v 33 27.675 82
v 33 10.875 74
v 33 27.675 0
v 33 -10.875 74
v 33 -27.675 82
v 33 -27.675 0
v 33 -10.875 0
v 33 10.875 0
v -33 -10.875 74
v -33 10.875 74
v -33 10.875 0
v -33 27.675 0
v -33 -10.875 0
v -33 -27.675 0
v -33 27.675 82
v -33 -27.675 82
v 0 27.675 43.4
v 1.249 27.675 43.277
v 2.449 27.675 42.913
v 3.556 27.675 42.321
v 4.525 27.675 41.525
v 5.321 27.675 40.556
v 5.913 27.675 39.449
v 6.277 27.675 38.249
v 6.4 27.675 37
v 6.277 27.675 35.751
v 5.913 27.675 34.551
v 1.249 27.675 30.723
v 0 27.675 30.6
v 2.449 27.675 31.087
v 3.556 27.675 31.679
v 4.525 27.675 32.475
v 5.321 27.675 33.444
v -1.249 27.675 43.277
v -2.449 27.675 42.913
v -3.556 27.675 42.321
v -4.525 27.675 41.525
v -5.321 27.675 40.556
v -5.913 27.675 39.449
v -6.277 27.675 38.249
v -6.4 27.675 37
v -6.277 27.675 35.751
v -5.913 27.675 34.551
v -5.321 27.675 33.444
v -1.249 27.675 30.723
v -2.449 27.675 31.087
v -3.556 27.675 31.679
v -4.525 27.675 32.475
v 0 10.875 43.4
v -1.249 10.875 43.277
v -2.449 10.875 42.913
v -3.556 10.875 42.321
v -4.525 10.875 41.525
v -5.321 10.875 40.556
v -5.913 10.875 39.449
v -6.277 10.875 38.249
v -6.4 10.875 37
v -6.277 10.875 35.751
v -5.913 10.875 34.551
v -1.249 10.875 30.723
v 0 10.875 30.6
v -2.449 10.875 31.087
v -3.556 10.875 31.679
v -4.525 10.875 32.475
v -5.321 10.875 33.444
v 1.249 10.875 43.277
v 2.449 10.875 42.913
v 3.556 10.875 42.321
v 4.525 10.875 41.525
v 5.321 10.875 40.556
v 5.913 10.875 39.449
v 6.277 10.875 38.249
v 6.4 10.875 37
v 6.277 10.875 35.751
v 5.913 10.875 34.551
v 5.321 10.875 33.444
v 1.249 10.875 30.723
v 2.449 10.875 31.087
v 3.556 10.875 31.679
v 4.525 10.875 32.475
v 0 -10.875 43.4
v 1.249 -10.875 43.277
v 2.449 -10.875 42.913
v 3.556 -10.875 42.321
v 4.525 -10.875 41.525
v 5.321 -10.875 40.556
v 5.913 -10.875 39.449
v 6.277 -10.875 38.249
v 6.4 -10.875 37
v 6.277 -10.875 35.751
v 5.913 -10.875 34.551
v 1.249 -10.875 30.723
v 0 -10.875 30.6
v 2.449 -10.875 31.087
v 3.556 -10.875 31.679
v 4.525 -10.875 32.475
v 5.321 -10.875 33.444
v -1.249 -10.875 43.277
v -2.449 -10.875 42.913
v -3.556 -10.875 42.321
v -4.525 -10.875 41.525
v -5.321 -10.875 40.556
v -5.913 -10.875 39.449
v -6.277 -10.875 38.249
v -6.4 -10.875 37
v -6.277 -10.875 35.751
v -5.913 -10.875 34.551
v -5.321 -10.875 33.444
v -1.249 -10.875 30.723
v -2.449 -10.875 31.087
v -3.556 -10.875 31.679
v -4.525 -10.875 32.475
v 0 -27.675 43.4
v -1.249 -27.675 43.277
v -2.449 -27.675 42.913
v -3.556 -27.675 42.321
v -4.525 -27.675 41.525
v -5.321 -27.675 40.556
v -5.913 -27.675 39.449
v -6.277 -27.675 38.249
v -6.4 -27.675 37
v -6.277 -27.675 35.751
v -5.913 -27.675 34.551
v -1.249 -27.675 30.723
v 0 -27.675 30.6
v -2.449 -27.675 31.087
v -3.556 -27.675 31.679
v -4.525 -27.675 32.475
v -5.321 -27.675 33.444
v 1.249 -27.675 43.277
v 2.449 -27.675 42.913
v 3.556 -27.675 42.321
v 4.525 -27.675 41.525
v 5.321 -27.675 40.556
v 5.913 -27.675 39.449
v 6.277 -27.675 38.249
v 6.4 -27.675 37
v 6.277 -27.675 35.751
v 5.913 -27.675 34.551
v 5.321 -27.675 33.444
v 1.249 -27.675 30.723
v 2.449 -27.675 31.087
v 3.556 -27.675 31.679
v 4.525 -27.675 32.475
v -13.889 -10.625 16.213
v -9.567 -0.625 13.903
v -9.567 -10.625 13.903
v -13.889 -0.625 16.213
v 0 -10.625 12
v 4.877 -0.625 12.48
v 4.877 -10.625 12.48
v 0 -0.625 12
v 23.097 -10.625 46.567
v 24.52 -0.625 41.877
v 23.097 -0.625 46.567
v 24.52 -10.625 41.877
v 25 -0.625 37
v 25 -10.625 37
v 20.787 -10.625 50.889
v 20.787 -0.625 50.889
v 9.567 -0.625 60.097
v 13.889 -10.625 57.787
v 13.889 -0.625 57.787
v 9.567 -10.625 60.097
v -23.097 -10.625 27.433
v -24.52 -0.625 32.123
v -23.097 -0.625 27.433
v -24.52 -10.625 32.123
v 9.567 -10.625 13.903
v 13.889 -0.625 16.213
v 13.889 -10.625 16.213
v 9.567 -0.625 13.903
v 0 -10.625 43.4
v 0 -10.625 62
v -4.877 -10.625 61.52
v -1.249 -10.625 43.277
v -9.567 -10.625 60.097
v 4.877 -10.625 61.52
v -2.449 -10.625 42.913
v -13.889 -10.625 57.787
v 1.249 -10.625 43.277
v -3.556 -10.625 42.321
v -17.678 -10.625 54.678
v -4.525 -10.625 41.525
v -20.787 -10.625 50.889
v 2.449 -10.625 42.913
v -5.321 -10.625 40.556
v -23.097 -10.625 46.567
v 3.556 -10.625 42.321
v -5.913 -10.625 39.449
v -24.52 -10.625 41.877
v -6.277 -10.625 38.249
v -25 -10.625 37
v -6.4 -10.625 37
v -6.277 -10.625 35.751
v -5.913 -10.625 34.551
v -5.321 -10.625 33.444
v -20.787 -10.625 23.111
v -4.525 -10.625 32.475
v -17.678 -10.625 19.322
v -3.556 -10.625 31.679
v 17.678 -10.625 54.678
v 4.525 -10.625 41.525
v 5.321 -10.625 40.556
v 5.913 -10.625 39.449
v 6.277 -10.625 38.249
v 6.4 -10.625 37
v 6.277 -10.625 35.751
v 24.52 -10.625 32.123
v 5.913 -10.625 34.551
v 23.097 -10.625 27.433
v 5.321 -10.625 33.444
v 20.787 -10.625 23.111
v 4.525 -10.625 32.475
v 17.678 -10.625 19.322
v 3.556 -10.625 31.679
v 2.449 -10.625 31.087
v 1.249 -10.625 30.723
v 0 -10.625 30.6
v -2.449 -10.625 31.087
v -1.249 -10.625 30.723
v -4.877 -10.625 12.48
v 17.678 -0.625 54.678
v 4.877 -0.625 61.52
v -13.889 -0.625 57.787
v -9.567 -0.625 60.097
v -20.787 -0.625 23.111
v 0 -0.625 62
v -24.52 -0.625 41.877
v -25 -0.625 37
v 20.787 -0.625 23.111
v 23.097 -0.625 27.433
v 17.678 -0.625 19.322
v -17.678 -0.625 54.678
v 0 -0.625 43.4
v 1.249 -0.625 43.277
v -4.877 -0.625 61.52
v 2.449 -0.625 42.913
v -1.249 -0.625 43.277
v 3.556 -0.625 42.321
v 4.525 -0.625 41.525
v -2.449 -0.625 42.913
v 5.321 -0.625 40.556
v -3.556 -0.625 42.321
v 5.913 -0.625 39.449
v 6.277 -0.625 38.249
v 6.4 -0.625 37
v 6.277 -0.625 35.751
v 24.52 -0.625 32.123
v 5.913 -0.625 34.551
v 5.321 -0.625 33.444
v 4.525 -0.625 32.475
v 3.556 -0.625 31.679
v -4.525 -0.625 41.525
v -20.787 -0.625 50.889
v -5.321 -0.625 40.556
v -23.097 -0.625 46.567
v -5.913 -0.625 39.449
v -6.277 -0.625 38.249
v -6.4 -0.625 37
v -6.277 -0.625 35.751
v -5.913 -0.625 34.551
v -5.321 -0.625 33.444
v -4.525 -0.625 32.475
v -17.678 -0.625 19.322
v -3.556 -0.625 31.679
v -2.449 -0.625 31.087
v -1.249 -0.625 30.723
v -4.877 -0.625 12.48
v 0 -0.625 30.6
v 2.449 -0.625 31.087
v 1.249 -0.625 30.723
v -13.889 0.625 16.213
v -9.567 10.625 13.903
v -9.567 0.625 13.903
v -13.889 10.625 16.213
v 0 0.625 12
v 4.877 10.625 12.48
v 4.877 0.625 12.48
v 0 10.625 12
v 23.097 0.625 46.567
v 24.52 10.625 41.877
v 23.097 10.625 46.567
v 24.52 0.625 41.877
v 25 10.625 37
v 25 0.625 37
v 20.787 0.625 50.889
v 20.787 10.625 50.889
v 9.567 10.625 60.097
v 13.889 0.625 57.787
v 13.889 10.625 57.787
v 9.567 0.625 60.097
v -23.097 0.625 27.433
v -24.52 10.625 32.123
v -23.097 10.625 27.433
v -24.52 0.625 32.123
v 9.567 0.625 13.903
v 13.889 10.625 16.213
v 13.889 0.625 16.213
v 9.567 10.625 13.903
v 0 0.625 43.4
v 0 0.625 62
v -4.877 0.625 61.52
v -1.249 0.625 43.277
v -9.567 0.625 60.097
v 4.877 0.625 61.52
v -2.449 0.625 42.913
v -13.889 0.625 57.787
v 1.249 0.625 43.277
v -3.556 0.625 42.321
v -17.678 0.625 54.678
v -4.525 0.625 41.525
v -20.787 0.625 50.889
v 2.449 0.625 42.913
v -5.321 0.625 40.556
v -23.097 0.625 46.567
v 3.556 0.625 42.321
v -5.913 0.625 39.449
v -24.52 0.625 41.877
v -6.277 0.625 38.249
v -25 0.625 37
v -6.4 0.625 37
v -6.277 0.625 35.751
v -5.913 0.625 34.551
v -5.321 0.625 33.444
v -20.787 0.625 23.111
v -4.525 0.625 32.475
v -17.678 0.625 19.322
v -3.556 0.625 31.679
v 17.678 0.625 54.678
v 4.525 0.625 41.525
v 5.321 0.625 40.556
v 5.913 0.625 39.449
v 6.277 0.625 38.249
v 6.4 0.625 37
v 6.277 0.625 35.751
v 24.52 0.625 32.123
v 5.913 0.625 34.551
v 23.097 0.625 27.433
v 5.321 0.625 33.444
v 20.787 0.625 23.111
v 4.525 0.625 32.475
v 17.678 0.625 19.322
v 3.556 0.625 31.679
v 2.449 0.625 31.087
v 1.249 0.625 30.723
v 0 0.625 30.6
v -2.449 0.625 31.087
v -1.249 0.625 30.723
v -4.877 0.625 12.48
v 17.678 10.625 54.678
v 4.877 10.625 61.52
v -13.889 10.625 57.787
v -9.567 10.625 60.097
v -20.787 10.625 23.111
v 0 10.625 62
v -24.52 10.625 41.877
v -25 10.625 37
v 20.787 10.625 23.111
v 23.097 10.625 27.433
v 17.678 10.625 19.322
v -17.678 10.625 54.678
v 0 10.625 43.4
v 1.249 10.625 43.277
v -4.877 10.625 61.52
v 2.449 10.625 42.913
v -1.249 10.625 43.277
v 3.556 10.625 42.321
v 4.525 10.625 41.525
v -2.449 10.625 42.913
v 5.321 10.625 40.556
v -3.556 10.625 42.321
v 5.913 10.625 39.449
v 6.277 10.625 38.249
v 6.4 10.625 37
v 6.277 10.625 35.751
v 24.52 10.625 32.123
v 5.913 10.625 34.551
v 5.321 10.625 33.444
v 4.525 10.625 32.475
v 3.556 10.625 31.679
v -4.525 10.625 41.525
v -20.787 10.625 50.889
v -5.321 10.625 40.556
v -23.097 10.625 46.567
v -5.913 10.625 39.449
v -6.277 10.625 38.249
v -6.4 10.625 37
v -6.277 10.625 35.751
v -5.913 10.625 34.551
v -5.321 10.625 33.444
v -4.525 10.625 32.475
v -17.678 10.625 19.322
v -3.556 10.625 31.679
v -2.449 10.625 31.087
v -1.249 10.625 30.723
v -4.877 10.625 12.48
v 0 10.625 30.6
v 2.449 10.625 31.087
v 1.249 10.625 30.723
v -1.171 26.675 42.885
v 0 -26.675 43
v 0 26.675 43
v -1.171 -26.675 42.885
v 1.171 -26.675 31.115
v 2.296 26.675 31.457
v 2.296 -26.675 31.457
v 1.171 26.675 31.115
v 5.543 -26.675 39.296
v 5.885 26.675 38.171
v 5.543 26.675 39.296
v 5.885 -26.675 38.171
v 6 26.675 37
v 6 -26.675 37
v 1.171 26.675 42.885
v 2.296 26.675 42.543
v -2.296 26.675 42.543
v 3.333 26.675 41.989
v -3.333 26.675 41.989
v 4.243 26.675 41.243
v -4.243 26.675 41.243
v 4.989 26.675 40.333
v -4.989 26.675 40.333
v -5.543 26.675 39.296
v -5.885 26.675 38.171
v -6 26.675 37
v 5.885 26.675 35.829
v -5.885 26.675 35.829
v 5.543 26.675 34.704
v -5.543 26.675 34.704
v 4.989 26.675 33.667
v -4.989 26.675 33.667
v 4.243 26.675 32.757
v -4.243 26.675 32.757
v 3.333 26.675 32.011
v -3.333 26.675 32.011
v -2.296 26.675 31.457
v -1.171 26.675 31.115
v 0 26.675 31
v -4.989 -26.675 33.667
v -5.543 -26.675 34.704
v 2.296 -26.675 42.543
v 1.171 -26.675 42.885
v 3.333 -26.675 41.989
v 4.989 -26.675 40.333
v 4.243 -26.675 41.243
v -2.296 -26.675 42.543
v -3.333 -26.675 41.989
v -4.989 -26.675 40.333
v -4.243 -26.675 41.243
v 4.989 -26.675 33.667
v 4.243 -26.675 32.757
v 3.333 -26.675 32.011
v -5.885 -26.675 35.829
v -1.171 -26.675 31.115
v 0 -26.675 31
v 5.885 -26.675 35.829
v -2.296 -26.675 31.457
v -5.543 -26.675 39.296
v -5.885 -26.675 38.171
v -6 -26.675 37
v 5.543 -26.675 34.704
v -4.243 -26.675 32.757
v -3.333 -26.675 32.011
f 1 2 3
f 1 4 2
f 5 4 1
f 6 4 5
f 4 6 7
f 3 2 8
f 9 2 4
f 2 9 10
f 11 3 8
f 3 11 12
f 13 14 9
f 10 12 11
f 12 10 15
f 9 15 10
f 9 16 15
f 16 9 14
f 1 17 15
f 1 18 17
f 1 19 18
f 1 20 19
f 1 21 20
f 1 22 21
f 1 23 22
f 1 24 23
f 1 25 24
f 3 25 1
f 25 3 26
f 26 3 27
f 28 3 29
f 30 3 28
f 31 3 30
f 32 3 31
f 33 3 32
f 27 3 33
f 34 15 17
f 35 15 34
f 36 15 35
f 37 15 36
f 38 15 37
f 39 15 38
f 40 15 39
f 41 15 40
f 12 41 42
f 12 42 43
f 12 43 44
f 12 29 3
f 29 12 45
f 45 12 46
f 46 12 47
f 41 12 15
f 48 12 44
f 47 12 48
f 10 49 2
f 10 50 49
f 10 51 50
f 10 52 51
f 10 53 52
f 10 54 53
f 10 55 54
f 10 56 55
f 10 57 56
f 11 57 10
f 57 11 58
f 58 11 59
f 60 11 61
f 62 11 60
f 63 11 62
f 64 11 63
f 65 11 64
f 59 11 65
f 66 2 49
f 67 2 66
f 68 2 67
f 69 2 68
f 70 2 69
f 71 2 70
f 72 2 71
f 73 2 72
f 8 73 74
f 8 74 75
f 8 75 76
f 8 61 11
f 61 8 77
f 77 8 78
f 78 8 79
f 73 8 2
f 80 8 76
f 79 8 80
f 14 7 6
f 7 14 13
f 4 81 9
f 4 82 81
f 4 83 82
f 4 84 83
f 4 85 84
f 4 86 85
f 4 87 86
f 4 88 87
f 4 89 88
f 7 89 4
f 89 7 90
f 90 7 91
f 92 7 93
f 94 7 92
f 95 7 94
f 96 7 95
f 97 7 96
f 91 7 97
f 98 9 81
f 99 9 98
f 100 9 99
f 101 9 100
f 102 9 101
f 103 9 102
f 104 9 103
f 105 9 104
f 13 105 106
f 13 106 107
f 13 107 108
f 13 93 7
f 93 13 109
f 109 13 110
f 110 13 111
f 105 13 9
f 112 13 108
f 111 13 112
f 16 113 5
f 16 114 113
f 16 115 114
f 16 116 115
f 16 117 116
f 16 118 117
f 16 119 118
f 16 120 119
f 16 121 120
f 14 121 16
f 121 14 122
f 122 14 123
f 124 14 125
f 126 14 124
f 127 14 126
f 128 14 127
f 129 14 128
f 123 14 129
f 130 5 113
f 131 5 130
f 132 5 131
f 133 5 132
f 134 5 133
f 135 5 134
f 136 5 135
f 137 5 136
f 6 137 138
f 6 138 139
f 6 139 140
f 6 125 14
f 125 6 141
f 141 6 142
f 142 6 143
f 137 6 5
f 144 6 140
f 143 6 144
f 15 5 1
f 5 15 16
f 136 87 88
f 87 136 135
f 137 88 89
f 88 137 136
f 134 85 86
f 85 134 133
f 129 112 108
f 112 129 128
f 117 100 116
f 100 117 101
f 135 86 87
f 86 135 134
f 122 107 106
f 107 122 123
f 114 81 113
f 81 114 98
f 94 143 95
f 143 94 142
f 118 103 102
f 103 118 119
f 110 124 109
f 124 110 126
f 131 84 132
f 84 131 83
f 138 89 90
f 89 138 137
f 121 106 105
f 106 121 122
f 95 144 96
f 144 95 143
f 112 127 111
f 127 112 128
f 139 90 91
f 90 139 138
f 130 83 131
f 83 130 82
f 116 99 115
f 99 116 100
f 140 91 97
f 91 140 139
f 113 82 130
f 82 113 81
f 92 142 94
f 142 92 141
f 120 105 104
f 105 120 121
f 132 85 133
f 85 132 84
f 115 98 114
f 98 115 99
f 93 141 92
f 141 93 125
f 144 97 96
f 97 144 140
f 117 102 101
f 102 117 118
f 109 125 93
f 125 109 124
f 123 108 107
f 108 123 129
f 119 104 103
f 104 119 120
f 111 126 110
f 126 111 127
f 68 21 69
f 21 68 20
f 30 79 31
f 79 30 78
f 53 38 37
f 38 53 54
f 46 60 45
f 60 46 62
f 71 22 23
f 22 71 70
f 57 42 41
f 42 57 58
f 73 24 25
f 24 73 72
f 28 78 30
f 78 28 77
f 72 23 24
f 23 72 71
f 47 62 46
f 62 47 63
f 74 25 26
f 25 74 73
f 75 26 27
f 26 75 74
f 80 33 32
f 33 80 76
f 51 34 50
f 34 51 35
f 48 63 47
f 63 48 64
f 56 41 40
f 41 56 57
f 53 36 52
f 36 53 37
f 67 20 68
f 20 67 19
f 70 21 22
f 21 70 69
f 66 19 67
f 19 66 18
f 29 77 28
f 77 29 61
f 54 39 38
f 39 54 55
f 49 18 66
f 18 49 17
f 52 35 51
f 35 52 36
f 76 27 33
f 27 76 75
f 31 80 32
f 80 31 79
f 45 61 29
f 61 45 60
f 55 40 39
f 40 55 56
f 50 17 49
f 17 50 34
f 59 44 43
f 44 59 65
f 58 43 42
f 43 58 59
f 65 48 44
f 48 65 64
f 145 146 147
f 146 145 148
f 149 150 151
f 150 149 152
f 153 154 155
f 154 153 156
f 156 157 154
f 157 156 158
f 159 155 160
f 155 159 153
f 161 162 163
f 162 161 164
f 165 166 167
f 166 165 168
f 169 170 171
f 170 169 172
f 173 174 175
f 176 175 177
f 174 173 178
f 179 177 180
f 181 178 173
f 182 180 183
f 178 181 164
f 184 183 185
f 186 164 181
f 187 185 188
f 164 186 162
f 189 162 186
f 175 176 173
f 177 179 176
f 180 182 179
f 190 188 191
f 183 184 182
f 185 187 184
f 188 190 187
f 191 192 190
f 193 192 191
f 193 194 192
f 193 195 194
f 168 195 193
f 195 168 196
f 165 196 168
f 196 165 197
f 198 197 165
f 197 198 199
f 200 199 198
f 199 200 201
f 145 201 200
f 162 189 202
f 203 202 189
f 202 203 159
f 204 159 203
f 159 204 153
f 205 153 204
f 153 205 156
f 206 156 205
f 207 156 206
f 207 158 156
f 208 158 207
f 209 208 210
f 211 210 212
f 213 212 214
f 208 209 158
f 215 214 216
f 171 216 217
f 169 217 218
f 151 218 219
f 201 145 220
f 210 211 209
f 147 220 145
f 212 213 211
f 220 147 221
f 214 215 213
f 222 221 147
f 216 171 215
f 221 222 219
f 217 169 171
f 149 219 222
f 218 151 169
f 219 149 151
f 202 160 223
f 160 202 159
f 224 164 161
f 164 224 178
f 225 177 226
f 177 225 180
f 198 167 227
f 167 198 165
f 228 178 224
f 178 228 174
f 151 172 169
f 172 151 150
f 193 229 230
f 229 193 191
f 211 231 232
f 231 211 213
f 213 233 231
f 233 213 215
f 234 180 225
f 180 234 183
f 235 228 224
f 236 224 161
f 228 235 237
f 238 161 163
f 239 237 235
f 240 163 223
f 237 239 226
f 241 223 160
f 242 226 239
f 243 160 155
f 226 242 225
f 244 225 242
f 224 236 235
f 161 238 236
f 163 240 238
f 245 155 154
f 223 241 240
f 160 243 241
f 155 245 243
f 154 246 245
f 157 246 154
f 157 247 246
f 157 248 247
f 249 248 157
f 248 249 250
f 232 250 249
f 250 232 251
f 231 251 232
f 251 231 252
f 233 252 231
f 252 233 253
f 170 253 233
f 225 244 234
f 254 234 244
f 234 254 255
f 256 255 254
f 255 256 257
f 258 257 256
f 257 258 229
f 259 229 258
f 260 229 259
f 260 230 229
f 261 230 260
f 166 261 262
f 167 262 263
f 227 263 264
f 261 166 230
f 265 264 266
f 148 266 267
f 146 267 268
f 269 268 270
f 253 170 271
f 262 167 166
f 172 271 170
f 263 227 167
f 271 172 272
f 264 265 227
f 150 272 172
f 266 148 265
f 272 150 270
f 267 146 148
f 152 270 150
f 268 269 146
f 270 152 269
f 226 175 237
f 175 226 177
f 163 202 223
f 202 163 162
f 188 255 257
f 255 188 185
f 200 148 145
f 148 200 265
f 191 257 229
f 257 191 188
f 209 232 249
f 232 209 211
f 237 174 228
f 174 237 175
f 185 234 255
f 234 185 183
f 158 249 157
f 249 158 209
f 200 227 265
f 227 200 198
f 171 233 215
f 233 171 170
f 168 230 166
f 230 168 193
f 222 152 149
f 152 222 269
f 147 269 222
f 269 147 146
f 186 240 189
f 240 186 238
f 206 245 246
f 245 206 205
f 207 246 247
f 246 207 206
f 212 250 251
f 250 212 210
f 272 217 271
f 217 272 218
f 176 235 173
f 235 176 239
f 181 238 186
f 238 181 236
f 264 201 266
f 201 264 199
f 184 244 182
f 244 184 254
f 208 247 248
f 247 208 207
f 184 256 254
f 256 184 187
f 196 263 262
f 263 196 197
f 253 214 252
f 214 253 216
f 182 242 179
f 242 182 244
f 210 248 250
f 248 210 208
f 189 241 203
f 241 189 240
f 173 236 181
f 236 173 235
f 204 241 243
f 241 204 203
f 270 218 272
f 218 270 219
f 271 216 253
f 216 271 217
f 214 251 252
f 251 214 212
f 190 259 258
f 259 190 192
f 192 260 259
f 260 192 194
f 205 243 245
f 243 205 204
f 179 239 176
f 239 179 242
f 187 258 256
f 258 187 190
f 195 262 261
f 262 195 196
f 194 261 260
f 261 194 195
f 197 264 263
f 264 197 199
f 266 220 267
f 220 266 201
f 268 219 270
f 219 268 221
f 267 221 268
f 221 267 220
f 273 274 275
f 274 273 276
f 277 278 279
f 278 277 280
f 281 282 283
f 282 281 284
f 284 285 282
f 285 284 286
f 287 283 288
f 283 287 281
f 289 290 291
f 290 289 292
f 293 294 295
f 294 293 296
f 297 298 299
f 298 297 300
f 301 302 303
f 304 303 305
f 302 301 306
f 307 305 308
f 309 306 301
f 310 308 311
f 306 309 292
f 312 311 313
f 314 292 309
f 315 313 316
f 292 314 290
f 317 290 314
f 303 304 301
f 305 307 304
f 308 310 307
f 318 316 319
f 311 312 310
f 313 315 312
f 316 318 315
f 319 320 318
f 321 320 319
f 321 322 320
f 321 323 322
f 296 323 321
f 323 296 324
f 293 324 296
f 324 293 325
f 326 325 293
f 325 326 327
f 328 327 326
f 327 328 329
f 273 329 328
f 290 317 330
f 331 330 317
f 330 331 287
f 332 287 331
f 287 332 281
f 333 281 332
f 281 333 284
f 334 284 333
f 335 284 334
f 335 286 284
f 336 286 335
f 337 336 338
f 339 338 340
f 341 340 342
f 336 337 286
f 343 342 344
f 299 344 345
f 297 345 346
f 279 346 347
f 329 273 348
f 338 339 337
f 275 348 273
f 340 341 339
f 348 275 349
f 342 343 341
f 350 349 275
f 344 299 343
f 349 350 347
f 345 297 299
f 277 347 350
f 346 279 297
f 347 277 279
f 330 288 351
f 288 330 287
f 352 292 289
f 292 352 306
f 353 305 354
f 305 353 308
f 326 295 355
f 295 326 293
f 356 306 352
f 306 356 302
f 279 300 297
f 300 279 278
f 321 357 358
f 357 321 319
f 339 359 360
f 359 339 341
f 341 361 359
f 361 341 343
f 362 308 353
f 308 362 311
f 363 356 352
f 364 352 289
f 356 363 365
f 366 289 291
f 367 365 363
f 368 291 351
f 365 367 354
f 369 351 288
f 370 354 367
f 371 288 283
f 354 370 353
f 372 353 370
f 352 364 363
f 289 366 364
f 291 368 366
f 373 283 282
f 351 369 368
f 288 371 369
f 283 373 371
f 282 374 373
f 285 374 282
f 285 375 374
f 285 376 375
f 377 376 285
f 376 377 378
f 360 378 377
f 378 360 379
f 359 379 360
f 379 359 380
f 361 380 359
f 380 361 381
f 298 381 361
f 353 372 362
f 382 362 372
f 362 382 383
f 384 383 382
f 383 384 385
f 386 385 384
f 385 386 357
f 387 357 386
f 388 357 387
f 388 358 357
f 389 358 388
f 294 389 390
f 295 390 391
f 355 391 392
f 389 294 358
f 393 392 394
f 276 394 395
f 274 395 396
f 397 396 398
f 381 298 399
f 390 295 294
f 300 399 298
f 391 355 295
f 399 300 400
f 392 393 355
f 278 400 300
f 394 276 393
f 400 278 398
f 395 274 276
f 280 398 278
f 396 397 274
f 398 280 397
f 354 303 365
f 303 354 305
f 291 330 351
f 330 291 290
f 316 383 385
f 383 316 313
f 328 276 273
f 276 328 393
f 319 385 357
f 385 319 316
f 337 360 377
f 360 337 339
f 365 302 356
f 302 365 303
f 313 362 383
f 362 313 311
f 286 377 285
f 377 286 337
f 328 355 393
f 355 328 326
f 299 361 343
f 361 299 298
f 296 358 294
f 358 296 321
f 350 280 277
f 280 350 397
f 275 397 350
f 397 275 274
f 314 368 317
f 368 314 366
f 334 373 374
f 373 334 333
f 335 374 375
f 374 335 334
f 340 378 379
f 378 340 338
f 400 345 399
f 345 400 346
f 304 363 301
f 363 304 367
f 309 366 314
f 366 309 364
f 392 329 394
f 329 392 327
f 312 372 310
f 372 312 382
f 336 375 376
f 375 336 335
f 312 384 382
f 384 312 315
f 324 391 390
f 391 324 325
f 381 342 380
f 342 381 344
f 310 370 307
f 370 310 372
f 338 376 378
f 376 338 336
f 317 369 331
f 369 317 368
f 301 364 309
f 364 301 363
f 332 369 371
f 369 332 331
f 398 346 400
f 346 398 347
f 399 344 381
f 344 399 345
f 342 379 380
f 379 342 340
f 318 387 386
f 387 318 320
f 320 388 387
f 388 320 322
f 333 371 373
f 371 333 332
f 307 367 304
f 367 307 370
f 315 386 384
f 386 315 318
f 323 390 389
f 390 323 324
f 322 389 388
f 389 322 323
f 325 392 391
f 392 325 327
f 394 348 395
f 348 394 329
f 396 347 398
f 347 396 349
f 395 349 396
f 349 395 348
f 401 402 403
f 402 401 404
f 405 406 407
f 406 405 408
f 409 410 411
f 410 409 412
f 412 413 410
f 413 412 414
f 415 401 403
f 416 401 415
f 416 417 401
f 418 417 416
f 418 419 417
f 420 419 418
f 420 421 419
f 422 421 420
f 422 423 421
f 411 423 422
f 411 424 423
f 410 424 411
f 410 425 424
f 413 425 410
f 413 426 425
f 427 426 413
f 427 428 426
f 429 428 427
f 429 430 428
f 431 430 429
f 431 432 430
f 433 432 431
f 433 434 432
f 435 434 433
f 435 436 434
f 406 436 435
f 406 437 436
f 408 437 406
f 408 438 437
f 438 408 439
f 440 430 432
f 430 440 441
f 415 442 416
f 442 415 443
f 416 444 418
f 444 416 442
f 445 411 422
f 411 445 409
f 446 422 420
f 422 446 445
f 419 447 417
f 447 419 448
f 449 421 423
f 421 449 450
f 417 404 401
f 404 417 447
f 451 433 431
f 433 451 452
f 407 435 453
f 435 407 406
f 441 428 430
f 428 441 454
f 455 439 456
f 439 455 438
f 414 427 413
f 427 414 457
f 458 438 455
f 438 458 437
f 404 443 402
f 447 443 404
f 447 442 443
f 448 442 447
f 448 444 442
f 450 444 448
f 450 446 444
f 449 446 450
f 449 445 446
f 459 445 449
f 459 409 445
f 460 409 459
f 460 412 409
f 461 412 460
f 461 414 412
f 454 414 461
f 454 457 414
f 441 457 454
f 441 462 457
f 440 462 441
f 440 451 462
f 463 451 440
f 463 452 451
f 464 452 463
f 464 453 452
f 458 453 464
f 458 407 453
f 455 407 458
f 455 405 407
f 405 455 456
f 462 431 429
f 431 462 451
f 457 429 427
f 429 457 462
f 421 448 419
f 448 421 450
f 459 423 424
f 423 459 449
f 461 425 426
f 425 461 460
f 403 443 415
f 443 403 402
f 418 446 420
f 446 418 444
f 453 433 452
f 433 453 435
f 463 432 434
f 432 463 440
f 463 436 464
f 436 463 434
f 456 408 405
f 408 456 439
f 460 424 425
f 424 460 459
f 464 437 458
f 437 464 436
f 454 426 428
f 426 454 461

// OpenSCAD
$fn = 32;

// ------------------------------------------------------------------------
// Trolley wheel set: wheels d50, fork 74 mm tall
// Every part is its own module, assembly() places every instance.
// ------------------------------------------------------------------------

// --- part 1 ---
module trolley_fork() {
  difference() {
    union() {
      translate([-33, 10.875, 0]) cube([66, 16.8, 74]);
      translate([-33, -27.675, 0]) cube([66, 16.8, 74]);
      translate([-33, -27.675, 74]) cube([66, 55.35, 8]);
    }
    translate([0, -19.275, 37]) rotate([90, 0, 0]) cylinder(h = 18.8, d = 12.8, center = true);
    translate([0, 19.275, 37]) rotate([90, 0, 0]) cylinder(h = 18.8, d = 12.8, center = true);
  }
}

// --- part 2 ---
module trolley_wheel() {
  difference() {
      translate([0, 0, 0]) cylinder(h = 10, d = 50);
      translate([0, 0, -1]) cylinder(h = 12, d = 12.8);
    }
}

// --- part 3 ---
module trolley_axle() {
  translate([0, 0, -26.675]) cylinder(h = 53.35, d = 12);
}

// --- assembly ---
module assembly() {
  color([0.80, 0.24, 0.20]) translate([0, 0, 0]) rotate([0, 0, 0]) trolley_fork();
  color([0.20, 0.45, 0.75]) translate([0, -0.625, 37]) rotate([90, 0, 0]) trolley_wheel();
  color([0.25, 0.62, 0.32]) translate([0, 10.625, 37]) rotate([90, 0, 0]) trolley_wheel();
  color([0.92, 0.70, 0.18]) translate([0, 0, 37]) rotate([90, 0, 0]) trolley_axle();
}

assembly();
